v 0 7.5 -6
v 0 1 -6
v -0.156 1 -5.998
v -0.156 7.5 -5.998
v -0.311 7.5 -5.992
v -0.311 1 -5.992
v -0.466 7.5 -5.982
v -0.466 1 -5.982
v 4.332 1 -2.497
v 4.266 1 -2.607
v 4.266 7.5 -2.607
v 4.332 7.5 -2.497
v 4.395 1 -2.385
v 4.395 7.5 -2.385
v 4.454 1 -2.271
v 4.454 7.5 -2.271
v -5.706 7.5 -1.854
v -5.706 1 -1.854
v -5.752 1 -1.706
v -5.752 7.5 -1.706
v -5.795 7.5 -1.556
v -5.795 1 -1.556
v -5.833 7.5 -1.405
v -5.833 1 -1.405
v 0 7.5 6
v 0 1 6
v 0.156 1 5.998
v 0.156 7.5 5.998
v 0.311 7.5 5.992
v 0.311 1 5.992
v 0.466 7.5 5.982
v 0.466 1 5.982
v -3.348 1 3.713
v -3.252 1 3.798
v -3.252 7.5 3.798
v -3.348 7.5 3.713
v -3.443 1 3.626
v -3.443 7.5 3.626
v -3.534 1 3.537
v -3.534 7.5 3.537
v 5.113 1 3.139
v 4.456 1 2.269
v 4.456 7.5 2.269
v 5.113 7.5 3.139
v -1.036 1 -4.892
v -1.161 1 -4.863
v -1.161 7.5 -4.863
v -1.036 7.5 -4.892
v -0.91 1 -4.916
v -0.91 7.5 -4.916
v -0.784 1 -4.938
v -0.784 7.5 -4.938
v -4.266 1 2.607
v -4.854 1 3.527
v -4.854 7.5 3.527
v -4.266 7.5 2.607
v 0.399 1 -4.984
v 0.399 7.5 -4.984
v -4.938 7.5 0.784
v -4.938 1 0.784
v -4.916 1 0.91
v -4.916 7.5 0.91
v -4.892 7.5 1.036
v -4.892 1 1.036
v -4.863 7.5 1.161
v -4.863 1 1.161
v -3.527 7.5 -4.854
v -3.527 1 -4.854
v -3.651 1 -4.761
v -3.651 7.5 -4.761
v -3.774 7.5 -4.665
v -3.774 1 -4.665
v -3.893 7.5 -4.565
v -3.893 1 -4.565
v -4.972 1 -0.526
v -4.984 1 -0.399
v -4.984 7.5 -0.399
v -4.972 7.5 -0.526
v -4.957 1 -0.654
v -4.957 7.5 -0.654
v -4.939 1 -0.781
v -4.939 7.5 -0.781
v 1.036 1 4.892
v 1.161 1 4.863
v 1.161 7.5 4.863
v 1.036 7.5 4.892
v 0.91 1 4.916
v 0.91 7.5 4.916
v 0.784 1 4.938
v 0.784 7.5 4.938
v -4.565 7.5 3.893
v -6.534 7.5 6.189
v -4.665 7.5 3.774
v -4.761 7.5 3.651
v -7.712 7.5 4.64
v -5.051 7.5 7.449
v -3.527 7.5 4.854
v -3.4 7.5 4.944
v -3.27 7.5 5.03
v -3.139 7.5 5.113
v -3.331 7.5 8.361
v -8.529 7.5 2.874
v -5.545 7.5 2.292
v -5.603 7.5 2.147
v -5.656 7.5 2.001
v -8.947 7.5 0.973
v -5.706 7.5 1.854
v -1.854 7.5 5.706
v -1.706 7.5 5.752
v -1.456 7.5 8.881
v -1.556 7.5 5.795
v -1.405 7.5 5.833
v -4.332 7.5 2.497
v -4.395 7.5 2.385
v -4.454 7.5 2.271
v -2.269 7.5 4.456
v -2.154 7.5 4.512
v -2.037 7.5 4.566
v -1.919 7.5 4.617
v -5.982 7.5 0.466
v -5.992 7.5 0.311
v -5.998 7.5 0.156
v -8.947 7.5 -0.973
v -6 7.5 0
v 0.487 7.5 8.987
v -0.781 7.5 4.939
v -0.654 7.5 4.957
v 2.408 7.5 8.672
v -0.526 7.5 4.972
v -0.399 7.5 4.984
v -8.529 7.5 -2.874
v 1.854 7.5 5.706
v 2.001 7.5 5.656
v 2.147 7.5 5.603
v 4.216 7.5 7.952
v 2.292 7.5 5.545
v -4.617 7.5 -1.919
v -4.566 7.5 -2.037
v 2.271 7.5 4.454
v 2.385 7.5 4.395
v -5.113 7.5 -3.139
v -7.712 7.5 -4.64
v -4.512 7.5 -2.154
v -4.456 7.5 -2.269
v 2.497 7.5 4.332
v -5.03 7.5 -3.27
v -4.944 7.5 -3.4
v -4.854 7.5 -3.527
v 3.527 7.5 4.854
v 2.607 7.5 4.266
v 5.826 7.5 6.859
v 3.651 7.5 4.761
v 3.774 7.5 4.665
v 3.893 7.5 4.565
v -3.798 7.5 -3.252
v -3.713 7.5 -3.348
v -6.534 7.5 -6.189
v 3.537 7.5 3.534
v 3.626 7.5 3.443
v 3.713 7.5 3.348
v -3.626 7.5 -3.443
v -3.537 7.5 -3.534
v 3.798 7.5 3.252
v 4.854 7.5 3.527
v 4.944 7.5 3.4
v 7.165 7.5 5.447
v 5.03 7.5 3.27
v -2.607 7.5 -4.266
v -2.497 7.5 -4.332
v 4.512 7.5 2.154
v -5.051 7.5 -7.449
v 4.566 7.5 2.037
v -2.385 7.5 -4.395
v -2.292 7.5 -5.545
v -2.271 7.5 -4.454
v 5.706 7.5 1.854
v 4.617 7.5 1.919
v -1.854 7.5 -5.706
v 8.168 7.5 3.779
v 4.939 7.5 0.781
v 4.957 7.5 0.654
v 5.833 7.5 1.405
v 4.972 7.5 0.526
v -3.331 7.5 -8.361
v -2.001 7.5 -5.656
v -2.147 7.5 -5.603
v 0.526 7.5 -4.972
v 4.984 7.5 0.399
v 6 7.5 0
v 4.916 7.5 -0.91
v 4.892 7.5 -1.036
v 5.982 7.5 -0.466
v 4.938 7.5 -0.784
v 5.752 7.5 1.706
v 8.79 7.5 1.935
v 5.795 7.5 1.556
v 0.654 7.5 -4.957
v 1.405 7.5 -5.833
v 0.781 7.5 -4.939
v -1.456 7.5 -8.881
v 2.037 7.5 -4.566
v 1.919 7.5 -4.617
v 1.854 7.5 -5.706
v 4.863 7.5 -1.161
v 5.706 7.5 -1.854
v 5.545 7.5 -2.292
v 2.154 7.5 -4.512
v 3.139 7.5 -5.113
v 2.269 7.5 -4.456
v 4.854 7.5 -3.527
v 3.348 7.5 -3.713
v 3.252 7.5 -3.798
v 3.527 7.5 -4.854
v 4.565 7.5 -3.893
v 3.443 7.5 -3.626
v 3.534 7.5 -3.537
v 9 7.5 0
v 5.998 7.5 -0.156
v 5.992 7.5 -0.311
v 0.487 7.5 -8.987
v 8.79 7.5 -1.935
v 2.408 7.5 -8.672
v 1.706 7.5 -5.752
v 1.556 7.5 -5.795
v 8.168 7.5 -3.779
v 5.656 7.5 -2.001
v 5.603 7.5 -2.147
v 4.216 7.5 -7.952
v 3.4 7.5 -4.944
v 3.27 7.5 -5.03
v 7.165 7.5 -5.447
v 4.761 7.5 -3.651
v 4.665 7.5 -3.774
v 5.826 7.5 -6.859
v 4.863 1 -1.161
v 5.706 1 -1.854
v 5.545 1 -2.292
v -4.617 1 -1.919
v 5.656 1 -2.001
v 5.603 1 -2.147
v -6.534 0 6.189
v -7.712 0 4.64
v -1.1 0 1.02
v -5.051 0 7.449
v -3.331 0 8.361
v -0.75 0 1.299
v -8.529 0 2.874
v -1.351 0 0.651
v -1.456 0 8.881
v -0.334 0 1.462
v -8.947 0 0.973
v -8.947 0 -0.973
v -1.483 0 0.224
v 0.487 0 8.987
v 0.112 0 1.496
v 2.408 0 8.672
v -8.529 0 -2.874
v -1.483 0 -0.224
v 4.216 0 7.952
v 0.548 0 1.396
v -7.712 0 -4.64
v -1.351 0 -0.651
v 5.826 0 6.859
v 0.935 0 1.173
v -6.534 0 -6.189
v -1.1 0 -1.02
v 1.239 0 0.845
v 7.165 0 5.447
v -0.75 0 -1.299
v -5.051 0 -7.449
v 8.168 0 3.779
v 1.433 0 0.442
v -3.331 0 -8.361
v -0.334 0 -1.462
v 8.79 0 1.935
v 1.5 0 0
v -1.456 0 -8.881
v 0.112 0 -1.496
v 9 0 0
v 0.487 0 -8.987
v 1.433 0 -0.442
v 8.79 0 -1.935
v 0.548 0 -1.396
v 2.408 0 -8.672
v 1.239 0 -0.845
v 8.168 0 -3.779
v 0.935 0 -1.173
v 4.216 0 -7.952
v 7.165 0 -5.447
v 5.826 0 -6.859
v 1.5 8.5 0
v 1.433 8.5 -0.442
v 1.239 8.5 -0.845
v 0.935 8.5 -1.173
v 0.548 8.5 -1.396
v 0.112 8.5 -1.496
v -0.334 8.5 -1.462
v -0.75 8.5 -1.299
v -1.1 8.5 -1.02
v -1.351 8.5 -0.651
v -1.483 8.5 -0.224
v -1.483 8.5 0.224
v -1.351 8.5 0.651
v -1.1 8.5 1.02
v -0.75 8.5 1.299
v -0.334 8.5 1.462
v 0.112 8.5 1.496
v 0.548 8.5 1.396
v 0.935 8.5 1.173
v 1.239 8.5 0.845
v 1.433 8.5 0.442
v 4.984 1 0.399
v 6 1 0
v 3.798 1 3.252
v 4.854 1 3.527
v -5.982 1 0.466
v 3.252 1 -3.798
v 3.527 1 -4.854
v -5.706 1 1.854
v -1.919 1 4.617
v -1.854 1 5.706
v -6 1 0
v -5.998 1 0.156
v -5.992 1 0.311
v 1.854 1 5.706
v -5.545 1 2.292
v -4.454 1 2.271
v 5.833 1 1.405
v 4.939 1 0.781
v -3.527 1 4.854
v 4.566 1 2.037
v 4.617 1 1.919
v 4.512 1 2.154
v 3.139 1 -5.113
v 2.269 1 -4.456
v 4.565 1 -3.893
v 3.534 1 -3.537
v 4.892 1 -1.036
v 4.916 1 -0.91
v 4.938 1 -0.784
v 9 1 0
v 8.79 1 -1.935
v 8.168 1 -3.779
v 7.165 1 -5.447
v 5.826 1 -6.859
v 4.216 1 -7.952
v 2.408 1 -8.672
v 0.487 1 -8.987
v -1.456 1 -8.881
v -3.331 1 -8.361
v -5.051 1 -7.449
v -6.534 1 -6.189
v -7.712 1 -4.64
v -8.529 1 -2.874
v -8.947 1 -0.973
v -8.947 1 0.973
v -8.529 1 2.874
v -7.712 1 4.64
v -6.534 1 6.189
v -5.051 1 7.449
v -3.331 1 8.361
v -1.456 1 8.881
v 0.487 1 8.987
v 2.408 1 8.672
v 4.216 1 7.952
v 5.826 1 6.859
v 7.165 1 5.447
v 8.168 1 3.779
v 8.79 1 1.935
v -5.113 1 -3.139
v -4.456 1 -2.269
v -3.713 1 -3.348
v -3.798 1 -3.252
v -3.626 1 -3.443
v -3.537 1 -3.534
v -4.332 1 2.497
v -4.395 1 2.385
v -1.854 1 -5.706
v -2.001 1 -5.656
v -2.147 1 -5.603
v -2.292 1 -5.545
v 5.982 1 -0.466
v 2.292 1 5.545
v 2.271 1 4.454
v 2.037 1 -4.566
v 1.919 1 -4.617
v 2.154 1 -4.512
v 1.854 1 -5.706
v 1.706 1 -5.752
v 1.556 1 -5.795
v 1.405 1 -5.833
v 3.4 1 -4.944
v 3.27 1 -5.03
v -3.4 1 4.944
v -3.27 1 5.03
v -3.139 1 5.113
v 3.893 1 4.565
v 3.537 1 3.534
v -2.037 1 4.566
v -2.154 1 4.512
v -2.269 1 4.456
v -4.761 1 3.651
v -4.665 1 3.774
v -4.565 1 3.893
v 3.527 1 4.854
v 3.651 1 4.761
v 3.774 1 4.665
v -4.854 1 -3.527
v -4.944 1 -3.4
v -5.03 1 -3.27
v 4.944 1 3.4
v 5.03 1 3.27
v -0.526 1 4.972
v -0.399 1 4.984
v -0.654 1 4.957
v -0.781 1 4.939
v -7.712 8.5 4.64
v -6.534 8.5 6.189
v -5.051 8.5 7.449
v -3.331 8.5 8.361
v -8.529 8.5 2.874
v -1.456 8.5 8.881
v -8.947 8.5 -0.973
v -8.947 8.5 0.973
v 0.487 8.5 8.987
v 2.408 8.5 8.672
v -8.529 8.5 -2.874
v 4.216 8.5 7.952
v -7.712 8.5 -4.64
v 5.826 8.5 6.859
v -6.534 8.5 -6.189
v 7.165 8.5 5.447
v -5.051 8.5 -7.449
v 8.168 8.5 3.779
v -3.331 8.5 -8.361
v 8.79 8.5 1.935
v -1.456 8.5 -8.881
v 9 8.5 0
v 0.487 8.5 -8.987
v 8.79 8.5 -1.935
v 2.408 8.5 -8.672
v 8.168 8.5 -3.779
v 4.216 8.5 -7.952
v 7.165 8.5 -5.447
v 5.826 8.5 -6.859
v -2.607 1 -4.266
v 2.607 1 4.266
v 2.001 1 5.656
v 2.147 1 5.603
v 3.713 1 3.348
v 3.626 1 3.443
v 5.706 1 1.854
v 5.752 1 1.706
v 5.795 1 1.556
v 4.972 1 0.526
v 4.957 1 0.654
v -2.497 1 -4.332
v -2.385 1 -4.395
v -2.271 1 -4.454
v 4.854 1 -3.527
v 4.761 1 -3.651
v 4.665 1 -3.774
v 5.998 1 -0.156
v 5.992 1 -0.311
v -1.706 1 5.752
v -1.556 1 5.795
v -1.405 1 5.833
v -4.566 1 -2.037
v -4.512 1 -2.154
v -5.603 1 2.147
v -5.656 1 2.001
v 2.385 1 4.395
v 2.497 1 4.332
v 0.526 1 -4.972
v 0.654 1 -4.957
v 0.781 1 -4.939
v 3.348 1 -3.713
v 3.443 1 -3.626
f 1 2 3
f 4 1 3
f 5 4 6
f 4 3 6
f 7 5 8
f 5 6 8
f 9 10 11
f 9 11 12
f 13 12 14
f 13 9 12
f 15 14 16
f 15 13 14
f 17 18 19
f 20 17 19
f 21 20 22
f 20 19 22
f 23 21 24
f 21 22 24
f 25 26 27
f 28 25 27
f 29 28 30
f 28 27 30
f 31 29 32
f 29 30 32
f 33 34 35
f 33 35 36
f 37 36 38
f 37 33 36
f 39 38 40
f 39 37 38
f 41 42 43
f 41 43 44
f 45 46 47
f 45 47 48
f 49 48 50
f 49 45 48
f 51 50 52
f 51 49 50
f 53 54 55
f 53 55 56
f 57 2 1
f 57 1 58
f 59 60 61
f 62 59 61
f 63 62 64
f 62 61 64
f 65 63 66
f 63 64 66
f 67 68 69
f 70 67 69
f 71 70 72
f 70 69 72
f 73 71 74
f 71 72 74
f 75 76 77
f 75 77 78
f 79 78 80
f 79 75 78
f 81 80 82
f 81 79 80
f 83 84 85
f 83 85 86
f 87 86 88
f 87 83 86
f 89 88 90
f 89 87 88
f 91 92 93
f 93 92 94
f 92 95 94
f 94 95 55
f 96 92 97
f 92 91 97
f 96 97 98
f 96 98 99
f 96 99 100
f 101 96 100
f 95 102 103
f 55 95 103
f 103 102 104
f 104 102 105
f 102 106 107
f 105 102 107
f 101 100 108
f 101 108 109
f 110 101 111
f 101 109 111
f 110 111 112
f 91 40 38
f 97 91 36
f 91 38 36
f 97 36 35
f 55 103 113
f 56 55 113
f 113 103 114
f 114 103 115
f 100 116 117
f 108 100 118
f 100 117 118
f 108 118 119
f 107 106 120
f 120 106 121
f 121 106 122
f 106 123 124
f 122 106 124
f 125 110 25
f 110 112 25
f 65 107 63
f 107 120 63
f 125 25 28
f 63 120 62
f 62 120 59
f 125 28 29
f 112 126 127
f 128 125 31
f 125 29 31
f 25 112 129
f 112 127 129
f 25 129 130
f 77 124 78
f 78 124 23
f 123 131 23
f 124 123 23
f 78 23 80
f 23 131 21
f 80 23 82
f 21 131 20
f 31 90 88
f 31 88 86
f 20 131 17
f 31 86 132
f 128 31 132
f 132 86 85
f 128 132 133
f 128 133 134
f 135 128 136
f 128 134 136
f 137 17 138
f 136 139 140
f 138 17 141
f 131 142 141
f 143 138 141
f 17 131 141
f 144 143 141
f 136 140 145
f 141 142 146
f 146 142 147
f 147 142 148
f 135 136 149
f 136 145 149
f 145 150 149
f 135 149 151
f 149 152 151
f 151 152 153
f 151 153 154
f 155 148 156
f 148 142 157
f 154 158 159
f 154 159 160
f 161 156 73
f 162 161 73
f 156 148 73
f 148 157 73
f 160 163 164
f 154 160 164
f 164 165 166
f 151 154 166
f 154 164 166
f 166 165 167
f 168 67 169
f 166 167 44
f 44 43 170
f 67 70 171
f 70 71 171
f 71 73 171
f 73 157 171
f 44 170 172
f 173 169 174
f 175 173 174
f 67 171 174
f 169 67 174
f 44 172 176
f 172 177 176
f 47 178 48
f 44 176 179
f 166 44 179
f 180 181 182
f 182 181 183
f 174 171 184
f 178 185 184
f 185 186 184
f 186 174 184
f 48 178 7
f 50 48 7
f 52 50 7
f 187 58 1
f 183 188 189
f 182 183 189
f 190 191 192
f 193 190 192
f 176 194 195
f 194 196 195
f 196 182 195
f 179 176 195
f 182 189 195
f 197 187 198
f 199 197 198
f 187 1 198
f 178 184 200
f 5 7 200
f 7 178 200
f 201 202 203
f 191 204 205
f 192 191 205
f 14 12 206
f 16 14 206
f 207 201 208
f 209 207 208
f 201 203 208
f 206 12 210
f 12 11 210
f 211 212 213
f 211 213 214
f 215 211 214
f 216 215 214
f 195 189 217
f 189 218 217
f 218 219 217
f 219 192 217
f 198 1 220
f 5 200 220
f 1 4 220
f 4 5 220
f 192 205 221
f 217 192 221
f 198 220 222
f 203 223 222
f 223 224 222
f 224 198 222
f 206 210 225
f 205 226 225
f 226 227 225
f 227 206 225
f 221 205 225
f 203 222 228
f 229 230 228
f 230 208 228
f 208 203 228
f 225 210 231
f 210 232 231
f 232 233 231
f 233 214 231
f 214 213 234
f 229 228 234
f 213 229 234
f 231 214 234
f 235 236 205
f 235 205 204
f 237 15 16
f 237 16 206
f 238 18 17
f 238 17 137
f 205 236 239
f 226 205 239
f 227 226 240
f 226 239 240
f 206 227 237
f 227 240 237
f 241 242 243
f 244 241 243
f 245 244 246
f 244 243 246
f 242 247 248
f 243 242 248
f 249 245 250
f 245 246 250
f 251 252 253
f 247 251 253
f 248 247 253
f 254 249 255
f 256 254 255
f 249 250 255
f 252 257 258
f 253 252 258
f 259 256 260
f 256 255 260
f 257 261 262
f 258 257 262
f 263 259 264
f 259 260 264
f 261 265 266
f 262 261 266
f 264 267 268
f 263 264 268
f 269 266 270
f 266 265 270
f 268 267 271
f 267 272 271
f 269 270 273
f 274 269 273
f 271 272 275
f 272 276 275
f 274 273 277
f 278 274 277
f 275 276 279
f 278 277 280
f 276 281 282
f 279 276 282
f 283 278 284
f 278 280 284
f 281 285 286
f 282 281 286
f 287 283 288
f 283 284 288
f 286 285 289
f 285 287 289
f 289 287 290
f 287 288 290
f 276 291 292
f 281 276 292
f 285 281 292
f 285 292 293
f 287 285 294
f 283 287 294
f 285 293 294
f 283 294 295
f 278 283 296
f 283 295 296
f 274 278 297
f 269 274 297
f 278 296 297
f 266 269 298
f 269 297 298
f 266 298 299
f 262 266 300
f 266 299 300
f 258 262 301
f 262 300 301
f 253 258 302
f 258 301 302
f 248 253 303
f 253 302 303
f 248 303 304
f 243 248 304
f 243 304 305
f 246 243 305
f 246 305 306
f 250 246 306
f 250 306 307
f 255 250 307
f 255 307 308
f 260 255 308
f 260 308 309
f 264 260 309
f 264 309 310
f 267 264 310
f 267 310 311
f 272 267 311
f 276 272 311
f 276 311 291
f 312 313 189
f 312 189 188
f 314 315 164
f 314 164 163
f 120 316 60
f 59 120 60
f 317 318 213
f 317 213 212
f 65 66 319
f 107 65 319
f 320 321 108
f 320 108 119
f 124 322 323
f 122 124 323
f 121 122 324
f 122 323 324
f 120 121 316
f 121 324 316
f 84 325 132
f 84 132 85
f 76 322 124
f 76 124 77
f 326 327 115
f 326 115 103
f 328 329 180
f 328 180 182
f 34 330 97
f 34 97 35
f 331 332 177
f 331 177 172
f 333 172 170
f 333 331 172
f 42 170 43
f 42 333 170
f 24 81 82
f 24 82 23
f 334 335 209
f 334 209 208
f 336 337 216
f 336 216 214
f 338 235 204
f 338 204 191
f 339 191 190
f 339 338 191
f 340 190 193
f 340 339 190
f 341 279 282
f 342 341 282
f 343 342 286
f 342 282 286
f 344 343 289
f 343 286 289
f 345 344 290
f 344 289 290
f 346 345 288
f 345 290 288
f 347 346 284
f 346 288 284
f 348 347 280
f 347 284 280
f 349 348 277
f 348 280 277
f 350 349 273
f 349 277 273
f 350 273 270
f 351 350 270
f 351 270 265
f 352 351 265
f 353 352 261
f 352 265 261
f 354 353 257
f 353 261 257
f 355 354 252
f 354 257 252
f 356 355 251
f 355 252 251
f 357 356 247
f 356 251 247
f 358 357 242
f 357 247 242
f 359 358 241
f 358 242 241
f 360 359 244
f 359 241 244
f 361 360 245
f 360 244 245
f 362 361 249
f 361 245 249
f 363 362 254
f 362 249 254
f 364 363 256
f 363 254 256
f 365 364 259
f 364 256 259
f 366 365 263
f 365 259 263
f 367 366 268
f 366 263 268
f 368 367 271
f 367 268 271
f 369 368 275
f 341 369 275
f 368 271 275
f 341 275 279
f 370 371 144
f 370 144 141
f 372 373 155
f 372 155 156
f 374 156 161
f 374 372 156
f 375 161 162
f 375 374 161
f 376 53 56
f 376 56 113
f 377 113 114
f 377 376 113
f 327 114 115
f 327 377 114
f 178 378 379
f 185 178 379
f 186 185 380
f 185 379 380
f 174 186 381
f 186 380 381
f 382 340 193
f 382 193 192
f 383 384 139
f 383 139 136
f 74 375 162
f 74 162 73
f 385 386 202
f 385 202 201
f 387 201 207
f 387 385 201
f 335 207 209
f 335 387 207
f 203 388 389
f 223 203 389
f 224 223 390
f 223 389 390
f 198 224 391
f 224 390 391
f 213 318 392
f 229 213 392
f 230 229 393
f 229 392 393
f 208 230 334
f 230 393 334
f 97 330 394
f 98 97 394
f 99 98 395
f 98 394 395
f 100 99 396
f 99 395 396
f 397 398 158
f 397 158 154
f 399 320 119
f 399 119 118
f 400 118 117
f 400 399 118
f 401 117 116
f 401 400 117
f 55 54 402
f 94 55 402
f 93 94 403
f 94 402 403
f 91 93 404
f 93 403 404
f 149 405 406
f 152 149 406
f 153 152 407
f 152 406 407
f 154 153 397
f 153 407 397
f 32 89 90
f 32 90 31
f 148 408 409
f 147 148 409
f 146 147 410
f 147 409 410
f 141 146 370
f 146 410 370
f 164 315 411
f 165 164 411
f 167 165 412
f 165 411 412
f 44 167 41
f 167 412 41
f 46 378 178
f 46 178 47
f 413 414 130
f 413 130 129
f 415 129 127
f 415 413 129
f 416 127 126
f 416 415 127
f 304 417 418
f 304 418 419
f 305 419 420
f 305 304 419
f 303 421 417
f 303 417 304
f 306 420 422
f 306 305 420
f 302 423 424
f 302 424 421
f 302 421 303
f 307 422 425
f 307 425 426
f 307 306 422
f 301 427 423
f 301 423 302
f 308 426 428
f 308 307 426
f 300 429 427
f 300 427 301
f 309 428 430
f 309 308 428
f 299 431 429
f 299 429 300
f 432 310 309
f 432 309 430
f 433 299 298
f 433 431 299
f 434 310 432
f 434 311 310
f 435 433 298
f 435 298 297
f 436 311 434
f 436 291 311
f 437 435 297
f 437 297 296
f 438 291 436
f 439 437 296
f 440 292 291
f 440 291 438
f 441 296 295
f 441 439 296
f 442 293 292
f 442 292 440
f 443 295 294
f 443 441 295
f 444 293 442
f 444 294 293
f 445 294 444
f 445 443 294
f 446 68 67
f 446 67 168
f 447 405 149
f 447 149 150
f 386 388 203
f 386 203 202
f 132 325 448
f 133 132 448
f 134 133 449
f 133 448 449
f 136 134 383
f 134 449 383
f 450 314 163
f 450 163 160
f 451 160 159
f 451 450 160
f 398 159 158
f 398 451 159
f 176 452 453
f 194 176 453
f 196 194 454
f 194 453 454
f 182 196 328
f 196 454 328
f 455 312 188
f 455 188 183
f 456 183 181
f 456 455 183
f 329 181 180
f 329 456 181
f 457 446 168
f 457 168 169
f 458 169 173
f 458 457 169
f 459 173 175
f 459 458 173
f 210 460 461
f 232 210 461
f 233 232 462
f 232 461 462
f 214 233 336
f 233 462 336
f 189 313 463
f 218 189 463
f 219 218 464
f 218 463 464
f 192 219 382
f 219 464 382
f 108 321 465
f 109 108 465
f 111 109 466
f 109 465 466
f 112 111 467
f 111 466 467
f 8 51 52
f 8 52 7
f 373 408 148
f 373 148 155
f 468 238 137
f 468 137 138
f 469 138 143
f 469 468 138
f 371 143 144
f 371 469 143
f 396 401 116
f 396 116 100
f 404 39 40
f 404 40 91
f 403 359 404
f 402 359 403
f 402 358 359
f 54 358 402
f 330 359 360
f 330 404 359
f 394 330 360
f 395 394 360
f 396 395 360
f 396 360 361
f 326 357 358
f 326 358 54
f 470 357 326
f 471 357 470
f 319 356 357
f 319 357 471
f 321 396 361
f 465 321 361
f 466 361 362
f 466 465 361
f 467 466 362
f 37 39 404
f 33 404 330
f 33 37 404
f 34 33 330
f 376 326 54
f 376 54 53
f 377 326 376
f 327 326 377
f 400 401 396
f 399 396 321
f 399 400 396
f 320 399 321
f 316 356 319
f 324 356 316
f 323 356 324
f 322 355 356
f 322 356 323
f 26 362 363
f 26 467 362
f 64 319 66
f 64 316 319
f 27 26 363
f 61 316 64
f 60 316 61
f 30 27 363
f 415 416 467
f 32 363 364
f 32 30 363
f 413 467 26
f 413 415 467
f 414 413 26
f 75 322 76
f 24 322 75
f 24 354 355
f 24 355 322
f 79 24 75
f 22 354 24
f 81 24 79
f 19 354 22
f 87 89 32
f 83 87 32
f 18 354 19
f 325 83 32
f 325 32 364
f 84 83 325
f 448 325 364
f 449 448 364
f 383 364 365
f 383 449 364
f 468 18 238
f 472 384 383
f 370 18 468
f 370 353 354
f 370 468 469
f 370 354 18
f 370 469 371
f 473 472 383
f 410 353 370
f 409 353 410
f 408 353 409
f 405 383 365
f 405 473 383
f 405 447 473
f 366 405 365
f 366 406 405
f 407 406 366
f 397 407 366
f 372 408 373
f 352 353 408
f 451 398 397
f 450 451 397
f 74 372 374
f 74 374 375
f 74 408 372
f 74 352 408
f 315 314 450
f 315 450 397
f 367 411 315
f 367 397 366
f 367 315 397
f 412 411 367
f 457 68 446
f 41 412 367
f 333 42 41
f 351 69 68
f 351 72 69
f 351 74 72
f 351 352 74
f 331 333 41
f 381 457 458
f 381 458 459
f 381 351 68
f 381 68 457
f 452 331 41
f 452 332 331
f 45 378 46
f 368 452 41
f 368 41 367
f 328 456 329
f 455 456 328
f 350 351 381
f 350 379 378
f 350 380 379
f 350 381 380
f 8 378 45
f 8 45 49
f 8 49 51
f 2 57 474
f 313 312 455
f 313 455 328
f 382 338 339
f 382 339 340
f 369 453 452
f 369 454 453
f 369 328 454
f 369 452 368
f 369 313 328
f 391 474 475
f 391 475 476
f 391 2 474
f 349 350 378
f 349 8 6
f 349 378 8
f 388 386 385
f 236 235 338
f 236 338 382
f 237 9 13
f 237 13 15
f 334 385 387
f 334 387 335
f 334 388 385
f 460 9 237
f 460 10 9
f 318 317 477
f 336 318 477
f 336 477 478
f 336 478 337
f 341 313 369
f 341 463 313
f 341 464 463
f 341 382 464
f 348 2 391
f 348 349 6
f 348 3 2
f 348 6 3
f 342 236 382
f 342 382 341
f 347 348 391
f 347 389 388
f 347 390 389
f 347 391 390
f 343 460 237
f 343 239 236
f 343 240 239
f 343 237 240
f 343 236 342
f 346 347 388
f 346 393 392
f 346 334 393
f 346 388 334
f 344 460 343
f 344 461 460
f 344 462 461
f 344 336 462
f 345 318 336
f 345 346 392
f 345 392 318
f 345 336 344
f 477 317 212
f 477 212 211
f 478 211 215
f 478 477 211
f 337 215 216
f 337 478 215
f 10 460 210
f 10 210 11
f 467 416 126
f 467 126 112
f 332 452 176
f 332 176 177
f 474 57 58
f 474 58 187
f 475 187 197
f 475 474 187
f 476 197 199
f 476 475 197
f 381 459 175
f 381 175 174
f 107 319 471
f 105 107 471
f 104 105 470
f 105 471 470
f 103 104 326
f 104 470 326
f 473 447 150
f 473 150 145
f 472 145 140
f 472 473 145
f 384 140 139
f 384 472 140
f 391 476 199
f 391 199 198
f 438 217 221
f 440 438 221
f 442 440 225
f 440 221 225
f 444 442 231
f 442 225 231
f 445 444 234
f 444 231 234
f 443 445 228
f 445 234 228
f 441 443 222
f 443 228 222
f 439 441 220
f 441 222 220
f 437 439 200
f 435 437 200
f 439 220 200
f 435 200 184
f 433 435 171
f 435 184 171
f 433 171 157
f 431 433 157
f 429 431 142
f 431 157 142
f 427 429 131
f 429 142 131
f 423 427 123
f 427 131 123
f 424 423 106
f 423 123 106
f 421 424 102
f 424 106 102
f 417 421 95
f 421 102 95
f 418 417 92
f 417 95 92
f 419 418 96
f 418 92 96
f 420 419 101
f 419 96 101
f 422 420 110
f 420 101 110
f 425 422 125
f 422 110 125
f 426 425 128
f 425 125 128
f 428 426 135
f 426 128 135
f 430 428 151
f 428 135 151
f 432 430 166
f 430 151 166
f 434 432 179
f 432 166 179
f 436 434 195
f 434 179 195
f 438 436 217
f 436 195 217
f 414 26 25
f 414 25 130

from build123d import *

# Parameters (mm, degrees)
SKETCH_1_R          = 9
EXTRUDE_1_DEPTH     = 1
SKETCH_2_R          = 6
EXTRUDE_2_DEPTH     = 6.5
SKETCH_3_R          = 9
EXTRUDE_3_DEPTH     = 1
SKETCH_4_R          = 1.5
CUT_EXTRUDE_1_DEPTH = 9.5
CUT_EXTRUDE_2_DEPTH = 6.5


with BuildPart() as part:
    # 草图1 → 凸台-拉伸1 (new body)
    with BuildSketch(Plane(origin=(0, 0, 0), x_dir=(1, 0, 0), z_dir=(0, 1, 0))):
        Circle(SKETCH_1_R)
    extrude(amount=EXTRUDE_1_DEPTH)

    # 草图2 → 凸台-拉伸2 (add)
    with BuildSketch(Plane(origin=(0, 1, 0), x_dir=(1, 0, 0), z_dir=(0, 1, 0))):
        Circle(SKETCH_2_R)
    extrude(amount=EXTRUDE_2_DEPTH)

    # 草图3 → 凸台-拉伸3 (add)
    with BuildSketch(Plane(origin=(0, 7.5, 0), x_dir=(1, 0, 0), z_dir=(0, 1, 0))):
        Circle(SKETCH_3_R)
    extrude(amount=EXTRUDE_3_DEPTH)

    # 草图4 → 切除-拉伸1 (cut, through all)
    with BuildSketch(Plane(origin=(0, 8.5, 0), x_dir=(1, 0, 0), z_dir=(0, 1, 0))):
        Circle(SKETCH_4_R)
    extrude(amount=-CUT_EXTRUDE_1_DEPTH, mode=Mode.SUBTRACT)

    # 草图5 → 切除-拉伸2 (cut)
    with BuildSketch(Plane(origin=(0, 1, 0), x_dir=(1, 0, 0), z_dir=(0, 1, 0))):
        with BuildLine():
            Line((-6, 0), (-4.984088538, 0.398574263))
            ThreePointArc((-4.984088538, 0.398574263), (-4.96506054, 0.590062568), (-4.938678327, 0.780676876))
            Line((-4.938678327, 0.780676876), (-5.83314158, 1.40515455))
            ThreePointArc((-5.83314158, 1.40515455), (-5.958139369, 0.707513435), (-6, 0))
        make_face()
        with BuildLine():
            Line((-5.981863946, -0.466158487), (-4.938204626, -0.783667703))
            ThreePointArc((-4.938204626, -0.783667703), (-4.904392542, -0.973105234), (-4.863316103, -1.161101409))
            Line((-4.863316103, -1.161101409), (-5.706339098, -1.854101966))
            ThreePointArc((-5.706339098, -1.854101966), (-5.885160947, -1.168281057), (-5.981863946, -0.466158487))
        make_face()
        with BuildLine():
            Line((-5.706339098, 1.854101966), (-4.616983661, 1.91923471))
            ThreePointArc((-4.616983661, 1.91923471), (-4.539713819, 2.095470935), (-4.455719783, 2.268603363))
            Line((-4.455719783, 2.268603363), (-5.113430674, 3.13892127))
            ThreePointArc((-5.113430674, 3.13892127), (-5.447893597, 2.514051583), (-5.706339098, 1.854101966))
        make_face()
        with BuildLine():
            Line((-4.854101966, 3.526711514), (-3.797936255, 3.252027091))
            ThreePointArc((-3.797936255, 3.252027091), (-3.669988279, 3.395760008), (-3.536604341, 3.534463146))
            Line((-3.536604341, 3.534463146), (-3.893181547, 4.565428506))
            ThreePointArc((-3.893181547, 4.565428506), (-4.404370041, 4.074496845), (-4.854101966, 3.526711514))
        make_face()
        with BuildLine():
            Line((-3.526711514, 4.854101966), (-2.607120386, 4.266488403))
            ThreePointArc((-2.607120386, 4.266488403), (-2.441018717, 4.36364843), (-2.271301426, 4.454345051))
            Line((-2.271301426, 4.454345051), (-2.291840684, 5.545039791))
            ThreePointArc((-2.291840684, 5.545039791), (-2.929716059, 5.236101967), (-3.526711514, 4.854101966))
        make_face()
        with BuildLine():
            Line((-1.854101966, 5.706339098), (-1.161101409, 4.863316103))
            ThreePointArc((-1.161101409, 4.863316103), (-0.973105234, 4.904392542), (-0.783667703, 4.938204626))
            Line((-0.783667703, 4.938204626), (-0.466158487, 5.981863946))
            ThreePointArc((-0.466158487, 5.981863946), (-1.168281057, 5.885160947), (-1.854101966, 5.706339098))
        make_face()
        with BuildLine():
            Line((0, 6), (0.398574263, 4.984088538))
            ThreePointArc((0.398574263, 4.984088538), (0.590062568, 4.96506054), (0.780676876, 4.938678327))
            Line((0.780676876, 4.938678327), (1.40515455, 5.83314158))
            ThreePointArc((1.40515455, 5.83314158), (0.707513435, 5.958139369), (0, 6))
        make_face()
        with BuildLine():
            Line((1.854101966, 5.706339098), (1.91923471, 4.616983661))
            ThreePointArc((1.91923471, 4.616983661), (2.095470935, 4.539713819), (2.268603363, 4.455719783))
            Line((2.268603363, 4.455719783), (3.13892127, 5.113430674))
            ThreePointArc((3.13892127, 5.113430674), (2.514051583, 5.447893597), (1.854101966, 5.706339098))
        make_face()
        with BuildLine():
            Line((3.526711514, 4.854101966), (3.252027091, 3.797936255))
            ThreePointArc((3.252027091, 3.797936255), (3.395760008, 3.669988279), (3.534463146, 3.536604341))
            Line((3.534463146, 3.536604341), (4.565428506, 3.893181547))
            ThreePointArc((4.565428506, 3.893181547), (4.074496845, 4.404370041), (3.526711514, 4.854101966))
        make_face()
        with BuildLine():
            Line((4.854101966, 3.526711514), (4.266488403, 2.607120386))
            ThreePointArc((4.266488403, 2.607120386), (4.36364843, 2.441018717), (4.454345051, 2.271301426))
            Line((4.454345051, 2.271301426), (5.545039791, 2.291840684))
            ThreePointArc((5.545039791, 2.291840684), (5.236101967, 2.929716059), (4.854101966, 3.526711514))
        make_face()
        with BuildLine():
            Line((5.706339098, 1.854101966), (4.863316103, 1.161101409))
            ThreePointArc((4.863316103, 1.161101409), (4.904392542, 0.973105234), (4.938204626, 0.783667703))
            Line((4.938204626, 0.783667703), (5.981863946, 0.466158487))
            ThreePointArc((5.981863946, 0.466158487), (5.885160947, 1.168281057), (5.706339098, 1.854101966))
        make_face()
        with BuildLine():
            Line((6, 0), (4.984088538, -0.398574263))
            ThreePointArc((4.984088538, -0.398574263), (4.96506054, -0.590062568), (4.938678327, -0.780676876))
            Line((4.938678327, -0.780676876), (5.83314158, -1.40515455))
            ThreePointArc((5.83314158, -1.40515455), (5.958139369, -0.707513435), (6, 0))
        make_face()
        with BuildLine():
            Line((5.706339098, -1.854101966), (4.616983661, -1.91923471))
            ThreePointArc((4.616983661, -1.91923471), (4.539713819, -2.095470935), (4.455719783, -2.268603363))
            Line((4.455719783, -2.268603363), (5.113430674, -3.13892127))
            ThreePointArc((5.113430674, -3.13892127), (5.447893597, -2.514051583), (5.706339098, -1.854101966))
        make_face()
        with BuildLine():
            Line((4.854101966, -3.526711514), (3.797936255, -3.252027091))
            ThreePointArc((3.797936255, -3.252027091), (3.669988279, -3.395760008), (3.536604341, -3.534463146))
            Line((3.536604341, -3.534463146), (3.893181547, -4.565428506))
            ThreePointArc((3.893181547, -4.565428506), (4.404370041, -4.074496845), (4.854101966, -3.526711514))
        make_face()
        with BuildLine():
            Line((3.526711514, -4.854101966), (2.607120386, -4.266488403))
            ThreePointArc((2.607120386, -4.266488403), (2.441018717, -4.36364843), (2.271301426, -4.454345051))
            Line((2.271301426, -4.454345051), (2.291840684, -5.545039791))
            ThreePointArc((2.291840684, -5.545039791), (2.929716059, -5.236101967), (3.526711514, -4.854101966))
        make_face()
        with BuildLine():
            Line((1.854101966, -5.706339098), (1.161101409, -4.863316103))
            ThreePointArc((1.161101409, -4.863316103), (0.973105234, -4.904392542), (0.783667703, -4.938204626))
            Line((0.783667703, -4.938204626), (0.466158487, -5.981863946))
            ThreePointArc((0.466158487, -5.981863946), (1.168281057, -5.885160947), (1.854101966, -5.706339098))
        make_face()
        with BuildLine():
            Line((0, -6), (-0.398574263, -4.984088538))
            ThreePointArc((-0.398574263, -4.984088538), (-0.590062568, -4.96506054), (-0.780676876, -4.938678327))
            Line((-0.780676876, -4.938678327), (-1.40515455, -5.83314158))
            ThreePointArc((-1.40515455, -5.83314158), (-0.707513435, -5.958139369), (0, -6))
        make_face()
        with BuildLine():
            Line((-1.854101966, -5.706339098), (-1.91923471, -4.616983661))
            ThreePointArc((-1.91923471, -4.616983661), (-2.095470935, -4.539713819), (-2.268603363, -4.455719783))
            Line((-2.268603363, -4.455719783), (-3.13892127, -5.113430674))
            ThreePointArc((-3.13892127, -5.113430674), (-2.514051583, -5.447893597), (-1.854101966, -5.706339098))
        make_face()
        with BuildLine():
            Line((-3.526711514, -4.854101966), (-3.252027091, -3.797936255))
            ThreePointArc((-3.252027091, -3.797936255), (-3.395760008, -3.669988279), (-3.534463146, -3.536604341))
            Line((-3.534463146, -3.536604341), (-4.565428506, -3.893181547))
            ThreePointArc((-4.565428506, -3.893181547), (-4.074496845, -4.404370041), (-3.526711514, -4.854101966))
        make_face()
        with BuildLine():
            Line((-4.854101966, -3.526711514), (-4.266488403, -2.607120386))
            ThreePointArc((-4.266488403, -2.607120386), (-4.36364843, -2.441018717), (-4.454345051, -2.271301426))
            Line((-4.454345051, -2.271301426), (-5.545039791, -2.291840684))
            ThreePointArc((-5.545039791, -2.291840684), (-5.236101967, -2.929716059), (-4.854101966, -3.526711514))
        make_face()
    extrude(amount=CUT_EXTRUDE_2_DEPTH, mode=Mode.SUBTRACT)


solid = part.part
